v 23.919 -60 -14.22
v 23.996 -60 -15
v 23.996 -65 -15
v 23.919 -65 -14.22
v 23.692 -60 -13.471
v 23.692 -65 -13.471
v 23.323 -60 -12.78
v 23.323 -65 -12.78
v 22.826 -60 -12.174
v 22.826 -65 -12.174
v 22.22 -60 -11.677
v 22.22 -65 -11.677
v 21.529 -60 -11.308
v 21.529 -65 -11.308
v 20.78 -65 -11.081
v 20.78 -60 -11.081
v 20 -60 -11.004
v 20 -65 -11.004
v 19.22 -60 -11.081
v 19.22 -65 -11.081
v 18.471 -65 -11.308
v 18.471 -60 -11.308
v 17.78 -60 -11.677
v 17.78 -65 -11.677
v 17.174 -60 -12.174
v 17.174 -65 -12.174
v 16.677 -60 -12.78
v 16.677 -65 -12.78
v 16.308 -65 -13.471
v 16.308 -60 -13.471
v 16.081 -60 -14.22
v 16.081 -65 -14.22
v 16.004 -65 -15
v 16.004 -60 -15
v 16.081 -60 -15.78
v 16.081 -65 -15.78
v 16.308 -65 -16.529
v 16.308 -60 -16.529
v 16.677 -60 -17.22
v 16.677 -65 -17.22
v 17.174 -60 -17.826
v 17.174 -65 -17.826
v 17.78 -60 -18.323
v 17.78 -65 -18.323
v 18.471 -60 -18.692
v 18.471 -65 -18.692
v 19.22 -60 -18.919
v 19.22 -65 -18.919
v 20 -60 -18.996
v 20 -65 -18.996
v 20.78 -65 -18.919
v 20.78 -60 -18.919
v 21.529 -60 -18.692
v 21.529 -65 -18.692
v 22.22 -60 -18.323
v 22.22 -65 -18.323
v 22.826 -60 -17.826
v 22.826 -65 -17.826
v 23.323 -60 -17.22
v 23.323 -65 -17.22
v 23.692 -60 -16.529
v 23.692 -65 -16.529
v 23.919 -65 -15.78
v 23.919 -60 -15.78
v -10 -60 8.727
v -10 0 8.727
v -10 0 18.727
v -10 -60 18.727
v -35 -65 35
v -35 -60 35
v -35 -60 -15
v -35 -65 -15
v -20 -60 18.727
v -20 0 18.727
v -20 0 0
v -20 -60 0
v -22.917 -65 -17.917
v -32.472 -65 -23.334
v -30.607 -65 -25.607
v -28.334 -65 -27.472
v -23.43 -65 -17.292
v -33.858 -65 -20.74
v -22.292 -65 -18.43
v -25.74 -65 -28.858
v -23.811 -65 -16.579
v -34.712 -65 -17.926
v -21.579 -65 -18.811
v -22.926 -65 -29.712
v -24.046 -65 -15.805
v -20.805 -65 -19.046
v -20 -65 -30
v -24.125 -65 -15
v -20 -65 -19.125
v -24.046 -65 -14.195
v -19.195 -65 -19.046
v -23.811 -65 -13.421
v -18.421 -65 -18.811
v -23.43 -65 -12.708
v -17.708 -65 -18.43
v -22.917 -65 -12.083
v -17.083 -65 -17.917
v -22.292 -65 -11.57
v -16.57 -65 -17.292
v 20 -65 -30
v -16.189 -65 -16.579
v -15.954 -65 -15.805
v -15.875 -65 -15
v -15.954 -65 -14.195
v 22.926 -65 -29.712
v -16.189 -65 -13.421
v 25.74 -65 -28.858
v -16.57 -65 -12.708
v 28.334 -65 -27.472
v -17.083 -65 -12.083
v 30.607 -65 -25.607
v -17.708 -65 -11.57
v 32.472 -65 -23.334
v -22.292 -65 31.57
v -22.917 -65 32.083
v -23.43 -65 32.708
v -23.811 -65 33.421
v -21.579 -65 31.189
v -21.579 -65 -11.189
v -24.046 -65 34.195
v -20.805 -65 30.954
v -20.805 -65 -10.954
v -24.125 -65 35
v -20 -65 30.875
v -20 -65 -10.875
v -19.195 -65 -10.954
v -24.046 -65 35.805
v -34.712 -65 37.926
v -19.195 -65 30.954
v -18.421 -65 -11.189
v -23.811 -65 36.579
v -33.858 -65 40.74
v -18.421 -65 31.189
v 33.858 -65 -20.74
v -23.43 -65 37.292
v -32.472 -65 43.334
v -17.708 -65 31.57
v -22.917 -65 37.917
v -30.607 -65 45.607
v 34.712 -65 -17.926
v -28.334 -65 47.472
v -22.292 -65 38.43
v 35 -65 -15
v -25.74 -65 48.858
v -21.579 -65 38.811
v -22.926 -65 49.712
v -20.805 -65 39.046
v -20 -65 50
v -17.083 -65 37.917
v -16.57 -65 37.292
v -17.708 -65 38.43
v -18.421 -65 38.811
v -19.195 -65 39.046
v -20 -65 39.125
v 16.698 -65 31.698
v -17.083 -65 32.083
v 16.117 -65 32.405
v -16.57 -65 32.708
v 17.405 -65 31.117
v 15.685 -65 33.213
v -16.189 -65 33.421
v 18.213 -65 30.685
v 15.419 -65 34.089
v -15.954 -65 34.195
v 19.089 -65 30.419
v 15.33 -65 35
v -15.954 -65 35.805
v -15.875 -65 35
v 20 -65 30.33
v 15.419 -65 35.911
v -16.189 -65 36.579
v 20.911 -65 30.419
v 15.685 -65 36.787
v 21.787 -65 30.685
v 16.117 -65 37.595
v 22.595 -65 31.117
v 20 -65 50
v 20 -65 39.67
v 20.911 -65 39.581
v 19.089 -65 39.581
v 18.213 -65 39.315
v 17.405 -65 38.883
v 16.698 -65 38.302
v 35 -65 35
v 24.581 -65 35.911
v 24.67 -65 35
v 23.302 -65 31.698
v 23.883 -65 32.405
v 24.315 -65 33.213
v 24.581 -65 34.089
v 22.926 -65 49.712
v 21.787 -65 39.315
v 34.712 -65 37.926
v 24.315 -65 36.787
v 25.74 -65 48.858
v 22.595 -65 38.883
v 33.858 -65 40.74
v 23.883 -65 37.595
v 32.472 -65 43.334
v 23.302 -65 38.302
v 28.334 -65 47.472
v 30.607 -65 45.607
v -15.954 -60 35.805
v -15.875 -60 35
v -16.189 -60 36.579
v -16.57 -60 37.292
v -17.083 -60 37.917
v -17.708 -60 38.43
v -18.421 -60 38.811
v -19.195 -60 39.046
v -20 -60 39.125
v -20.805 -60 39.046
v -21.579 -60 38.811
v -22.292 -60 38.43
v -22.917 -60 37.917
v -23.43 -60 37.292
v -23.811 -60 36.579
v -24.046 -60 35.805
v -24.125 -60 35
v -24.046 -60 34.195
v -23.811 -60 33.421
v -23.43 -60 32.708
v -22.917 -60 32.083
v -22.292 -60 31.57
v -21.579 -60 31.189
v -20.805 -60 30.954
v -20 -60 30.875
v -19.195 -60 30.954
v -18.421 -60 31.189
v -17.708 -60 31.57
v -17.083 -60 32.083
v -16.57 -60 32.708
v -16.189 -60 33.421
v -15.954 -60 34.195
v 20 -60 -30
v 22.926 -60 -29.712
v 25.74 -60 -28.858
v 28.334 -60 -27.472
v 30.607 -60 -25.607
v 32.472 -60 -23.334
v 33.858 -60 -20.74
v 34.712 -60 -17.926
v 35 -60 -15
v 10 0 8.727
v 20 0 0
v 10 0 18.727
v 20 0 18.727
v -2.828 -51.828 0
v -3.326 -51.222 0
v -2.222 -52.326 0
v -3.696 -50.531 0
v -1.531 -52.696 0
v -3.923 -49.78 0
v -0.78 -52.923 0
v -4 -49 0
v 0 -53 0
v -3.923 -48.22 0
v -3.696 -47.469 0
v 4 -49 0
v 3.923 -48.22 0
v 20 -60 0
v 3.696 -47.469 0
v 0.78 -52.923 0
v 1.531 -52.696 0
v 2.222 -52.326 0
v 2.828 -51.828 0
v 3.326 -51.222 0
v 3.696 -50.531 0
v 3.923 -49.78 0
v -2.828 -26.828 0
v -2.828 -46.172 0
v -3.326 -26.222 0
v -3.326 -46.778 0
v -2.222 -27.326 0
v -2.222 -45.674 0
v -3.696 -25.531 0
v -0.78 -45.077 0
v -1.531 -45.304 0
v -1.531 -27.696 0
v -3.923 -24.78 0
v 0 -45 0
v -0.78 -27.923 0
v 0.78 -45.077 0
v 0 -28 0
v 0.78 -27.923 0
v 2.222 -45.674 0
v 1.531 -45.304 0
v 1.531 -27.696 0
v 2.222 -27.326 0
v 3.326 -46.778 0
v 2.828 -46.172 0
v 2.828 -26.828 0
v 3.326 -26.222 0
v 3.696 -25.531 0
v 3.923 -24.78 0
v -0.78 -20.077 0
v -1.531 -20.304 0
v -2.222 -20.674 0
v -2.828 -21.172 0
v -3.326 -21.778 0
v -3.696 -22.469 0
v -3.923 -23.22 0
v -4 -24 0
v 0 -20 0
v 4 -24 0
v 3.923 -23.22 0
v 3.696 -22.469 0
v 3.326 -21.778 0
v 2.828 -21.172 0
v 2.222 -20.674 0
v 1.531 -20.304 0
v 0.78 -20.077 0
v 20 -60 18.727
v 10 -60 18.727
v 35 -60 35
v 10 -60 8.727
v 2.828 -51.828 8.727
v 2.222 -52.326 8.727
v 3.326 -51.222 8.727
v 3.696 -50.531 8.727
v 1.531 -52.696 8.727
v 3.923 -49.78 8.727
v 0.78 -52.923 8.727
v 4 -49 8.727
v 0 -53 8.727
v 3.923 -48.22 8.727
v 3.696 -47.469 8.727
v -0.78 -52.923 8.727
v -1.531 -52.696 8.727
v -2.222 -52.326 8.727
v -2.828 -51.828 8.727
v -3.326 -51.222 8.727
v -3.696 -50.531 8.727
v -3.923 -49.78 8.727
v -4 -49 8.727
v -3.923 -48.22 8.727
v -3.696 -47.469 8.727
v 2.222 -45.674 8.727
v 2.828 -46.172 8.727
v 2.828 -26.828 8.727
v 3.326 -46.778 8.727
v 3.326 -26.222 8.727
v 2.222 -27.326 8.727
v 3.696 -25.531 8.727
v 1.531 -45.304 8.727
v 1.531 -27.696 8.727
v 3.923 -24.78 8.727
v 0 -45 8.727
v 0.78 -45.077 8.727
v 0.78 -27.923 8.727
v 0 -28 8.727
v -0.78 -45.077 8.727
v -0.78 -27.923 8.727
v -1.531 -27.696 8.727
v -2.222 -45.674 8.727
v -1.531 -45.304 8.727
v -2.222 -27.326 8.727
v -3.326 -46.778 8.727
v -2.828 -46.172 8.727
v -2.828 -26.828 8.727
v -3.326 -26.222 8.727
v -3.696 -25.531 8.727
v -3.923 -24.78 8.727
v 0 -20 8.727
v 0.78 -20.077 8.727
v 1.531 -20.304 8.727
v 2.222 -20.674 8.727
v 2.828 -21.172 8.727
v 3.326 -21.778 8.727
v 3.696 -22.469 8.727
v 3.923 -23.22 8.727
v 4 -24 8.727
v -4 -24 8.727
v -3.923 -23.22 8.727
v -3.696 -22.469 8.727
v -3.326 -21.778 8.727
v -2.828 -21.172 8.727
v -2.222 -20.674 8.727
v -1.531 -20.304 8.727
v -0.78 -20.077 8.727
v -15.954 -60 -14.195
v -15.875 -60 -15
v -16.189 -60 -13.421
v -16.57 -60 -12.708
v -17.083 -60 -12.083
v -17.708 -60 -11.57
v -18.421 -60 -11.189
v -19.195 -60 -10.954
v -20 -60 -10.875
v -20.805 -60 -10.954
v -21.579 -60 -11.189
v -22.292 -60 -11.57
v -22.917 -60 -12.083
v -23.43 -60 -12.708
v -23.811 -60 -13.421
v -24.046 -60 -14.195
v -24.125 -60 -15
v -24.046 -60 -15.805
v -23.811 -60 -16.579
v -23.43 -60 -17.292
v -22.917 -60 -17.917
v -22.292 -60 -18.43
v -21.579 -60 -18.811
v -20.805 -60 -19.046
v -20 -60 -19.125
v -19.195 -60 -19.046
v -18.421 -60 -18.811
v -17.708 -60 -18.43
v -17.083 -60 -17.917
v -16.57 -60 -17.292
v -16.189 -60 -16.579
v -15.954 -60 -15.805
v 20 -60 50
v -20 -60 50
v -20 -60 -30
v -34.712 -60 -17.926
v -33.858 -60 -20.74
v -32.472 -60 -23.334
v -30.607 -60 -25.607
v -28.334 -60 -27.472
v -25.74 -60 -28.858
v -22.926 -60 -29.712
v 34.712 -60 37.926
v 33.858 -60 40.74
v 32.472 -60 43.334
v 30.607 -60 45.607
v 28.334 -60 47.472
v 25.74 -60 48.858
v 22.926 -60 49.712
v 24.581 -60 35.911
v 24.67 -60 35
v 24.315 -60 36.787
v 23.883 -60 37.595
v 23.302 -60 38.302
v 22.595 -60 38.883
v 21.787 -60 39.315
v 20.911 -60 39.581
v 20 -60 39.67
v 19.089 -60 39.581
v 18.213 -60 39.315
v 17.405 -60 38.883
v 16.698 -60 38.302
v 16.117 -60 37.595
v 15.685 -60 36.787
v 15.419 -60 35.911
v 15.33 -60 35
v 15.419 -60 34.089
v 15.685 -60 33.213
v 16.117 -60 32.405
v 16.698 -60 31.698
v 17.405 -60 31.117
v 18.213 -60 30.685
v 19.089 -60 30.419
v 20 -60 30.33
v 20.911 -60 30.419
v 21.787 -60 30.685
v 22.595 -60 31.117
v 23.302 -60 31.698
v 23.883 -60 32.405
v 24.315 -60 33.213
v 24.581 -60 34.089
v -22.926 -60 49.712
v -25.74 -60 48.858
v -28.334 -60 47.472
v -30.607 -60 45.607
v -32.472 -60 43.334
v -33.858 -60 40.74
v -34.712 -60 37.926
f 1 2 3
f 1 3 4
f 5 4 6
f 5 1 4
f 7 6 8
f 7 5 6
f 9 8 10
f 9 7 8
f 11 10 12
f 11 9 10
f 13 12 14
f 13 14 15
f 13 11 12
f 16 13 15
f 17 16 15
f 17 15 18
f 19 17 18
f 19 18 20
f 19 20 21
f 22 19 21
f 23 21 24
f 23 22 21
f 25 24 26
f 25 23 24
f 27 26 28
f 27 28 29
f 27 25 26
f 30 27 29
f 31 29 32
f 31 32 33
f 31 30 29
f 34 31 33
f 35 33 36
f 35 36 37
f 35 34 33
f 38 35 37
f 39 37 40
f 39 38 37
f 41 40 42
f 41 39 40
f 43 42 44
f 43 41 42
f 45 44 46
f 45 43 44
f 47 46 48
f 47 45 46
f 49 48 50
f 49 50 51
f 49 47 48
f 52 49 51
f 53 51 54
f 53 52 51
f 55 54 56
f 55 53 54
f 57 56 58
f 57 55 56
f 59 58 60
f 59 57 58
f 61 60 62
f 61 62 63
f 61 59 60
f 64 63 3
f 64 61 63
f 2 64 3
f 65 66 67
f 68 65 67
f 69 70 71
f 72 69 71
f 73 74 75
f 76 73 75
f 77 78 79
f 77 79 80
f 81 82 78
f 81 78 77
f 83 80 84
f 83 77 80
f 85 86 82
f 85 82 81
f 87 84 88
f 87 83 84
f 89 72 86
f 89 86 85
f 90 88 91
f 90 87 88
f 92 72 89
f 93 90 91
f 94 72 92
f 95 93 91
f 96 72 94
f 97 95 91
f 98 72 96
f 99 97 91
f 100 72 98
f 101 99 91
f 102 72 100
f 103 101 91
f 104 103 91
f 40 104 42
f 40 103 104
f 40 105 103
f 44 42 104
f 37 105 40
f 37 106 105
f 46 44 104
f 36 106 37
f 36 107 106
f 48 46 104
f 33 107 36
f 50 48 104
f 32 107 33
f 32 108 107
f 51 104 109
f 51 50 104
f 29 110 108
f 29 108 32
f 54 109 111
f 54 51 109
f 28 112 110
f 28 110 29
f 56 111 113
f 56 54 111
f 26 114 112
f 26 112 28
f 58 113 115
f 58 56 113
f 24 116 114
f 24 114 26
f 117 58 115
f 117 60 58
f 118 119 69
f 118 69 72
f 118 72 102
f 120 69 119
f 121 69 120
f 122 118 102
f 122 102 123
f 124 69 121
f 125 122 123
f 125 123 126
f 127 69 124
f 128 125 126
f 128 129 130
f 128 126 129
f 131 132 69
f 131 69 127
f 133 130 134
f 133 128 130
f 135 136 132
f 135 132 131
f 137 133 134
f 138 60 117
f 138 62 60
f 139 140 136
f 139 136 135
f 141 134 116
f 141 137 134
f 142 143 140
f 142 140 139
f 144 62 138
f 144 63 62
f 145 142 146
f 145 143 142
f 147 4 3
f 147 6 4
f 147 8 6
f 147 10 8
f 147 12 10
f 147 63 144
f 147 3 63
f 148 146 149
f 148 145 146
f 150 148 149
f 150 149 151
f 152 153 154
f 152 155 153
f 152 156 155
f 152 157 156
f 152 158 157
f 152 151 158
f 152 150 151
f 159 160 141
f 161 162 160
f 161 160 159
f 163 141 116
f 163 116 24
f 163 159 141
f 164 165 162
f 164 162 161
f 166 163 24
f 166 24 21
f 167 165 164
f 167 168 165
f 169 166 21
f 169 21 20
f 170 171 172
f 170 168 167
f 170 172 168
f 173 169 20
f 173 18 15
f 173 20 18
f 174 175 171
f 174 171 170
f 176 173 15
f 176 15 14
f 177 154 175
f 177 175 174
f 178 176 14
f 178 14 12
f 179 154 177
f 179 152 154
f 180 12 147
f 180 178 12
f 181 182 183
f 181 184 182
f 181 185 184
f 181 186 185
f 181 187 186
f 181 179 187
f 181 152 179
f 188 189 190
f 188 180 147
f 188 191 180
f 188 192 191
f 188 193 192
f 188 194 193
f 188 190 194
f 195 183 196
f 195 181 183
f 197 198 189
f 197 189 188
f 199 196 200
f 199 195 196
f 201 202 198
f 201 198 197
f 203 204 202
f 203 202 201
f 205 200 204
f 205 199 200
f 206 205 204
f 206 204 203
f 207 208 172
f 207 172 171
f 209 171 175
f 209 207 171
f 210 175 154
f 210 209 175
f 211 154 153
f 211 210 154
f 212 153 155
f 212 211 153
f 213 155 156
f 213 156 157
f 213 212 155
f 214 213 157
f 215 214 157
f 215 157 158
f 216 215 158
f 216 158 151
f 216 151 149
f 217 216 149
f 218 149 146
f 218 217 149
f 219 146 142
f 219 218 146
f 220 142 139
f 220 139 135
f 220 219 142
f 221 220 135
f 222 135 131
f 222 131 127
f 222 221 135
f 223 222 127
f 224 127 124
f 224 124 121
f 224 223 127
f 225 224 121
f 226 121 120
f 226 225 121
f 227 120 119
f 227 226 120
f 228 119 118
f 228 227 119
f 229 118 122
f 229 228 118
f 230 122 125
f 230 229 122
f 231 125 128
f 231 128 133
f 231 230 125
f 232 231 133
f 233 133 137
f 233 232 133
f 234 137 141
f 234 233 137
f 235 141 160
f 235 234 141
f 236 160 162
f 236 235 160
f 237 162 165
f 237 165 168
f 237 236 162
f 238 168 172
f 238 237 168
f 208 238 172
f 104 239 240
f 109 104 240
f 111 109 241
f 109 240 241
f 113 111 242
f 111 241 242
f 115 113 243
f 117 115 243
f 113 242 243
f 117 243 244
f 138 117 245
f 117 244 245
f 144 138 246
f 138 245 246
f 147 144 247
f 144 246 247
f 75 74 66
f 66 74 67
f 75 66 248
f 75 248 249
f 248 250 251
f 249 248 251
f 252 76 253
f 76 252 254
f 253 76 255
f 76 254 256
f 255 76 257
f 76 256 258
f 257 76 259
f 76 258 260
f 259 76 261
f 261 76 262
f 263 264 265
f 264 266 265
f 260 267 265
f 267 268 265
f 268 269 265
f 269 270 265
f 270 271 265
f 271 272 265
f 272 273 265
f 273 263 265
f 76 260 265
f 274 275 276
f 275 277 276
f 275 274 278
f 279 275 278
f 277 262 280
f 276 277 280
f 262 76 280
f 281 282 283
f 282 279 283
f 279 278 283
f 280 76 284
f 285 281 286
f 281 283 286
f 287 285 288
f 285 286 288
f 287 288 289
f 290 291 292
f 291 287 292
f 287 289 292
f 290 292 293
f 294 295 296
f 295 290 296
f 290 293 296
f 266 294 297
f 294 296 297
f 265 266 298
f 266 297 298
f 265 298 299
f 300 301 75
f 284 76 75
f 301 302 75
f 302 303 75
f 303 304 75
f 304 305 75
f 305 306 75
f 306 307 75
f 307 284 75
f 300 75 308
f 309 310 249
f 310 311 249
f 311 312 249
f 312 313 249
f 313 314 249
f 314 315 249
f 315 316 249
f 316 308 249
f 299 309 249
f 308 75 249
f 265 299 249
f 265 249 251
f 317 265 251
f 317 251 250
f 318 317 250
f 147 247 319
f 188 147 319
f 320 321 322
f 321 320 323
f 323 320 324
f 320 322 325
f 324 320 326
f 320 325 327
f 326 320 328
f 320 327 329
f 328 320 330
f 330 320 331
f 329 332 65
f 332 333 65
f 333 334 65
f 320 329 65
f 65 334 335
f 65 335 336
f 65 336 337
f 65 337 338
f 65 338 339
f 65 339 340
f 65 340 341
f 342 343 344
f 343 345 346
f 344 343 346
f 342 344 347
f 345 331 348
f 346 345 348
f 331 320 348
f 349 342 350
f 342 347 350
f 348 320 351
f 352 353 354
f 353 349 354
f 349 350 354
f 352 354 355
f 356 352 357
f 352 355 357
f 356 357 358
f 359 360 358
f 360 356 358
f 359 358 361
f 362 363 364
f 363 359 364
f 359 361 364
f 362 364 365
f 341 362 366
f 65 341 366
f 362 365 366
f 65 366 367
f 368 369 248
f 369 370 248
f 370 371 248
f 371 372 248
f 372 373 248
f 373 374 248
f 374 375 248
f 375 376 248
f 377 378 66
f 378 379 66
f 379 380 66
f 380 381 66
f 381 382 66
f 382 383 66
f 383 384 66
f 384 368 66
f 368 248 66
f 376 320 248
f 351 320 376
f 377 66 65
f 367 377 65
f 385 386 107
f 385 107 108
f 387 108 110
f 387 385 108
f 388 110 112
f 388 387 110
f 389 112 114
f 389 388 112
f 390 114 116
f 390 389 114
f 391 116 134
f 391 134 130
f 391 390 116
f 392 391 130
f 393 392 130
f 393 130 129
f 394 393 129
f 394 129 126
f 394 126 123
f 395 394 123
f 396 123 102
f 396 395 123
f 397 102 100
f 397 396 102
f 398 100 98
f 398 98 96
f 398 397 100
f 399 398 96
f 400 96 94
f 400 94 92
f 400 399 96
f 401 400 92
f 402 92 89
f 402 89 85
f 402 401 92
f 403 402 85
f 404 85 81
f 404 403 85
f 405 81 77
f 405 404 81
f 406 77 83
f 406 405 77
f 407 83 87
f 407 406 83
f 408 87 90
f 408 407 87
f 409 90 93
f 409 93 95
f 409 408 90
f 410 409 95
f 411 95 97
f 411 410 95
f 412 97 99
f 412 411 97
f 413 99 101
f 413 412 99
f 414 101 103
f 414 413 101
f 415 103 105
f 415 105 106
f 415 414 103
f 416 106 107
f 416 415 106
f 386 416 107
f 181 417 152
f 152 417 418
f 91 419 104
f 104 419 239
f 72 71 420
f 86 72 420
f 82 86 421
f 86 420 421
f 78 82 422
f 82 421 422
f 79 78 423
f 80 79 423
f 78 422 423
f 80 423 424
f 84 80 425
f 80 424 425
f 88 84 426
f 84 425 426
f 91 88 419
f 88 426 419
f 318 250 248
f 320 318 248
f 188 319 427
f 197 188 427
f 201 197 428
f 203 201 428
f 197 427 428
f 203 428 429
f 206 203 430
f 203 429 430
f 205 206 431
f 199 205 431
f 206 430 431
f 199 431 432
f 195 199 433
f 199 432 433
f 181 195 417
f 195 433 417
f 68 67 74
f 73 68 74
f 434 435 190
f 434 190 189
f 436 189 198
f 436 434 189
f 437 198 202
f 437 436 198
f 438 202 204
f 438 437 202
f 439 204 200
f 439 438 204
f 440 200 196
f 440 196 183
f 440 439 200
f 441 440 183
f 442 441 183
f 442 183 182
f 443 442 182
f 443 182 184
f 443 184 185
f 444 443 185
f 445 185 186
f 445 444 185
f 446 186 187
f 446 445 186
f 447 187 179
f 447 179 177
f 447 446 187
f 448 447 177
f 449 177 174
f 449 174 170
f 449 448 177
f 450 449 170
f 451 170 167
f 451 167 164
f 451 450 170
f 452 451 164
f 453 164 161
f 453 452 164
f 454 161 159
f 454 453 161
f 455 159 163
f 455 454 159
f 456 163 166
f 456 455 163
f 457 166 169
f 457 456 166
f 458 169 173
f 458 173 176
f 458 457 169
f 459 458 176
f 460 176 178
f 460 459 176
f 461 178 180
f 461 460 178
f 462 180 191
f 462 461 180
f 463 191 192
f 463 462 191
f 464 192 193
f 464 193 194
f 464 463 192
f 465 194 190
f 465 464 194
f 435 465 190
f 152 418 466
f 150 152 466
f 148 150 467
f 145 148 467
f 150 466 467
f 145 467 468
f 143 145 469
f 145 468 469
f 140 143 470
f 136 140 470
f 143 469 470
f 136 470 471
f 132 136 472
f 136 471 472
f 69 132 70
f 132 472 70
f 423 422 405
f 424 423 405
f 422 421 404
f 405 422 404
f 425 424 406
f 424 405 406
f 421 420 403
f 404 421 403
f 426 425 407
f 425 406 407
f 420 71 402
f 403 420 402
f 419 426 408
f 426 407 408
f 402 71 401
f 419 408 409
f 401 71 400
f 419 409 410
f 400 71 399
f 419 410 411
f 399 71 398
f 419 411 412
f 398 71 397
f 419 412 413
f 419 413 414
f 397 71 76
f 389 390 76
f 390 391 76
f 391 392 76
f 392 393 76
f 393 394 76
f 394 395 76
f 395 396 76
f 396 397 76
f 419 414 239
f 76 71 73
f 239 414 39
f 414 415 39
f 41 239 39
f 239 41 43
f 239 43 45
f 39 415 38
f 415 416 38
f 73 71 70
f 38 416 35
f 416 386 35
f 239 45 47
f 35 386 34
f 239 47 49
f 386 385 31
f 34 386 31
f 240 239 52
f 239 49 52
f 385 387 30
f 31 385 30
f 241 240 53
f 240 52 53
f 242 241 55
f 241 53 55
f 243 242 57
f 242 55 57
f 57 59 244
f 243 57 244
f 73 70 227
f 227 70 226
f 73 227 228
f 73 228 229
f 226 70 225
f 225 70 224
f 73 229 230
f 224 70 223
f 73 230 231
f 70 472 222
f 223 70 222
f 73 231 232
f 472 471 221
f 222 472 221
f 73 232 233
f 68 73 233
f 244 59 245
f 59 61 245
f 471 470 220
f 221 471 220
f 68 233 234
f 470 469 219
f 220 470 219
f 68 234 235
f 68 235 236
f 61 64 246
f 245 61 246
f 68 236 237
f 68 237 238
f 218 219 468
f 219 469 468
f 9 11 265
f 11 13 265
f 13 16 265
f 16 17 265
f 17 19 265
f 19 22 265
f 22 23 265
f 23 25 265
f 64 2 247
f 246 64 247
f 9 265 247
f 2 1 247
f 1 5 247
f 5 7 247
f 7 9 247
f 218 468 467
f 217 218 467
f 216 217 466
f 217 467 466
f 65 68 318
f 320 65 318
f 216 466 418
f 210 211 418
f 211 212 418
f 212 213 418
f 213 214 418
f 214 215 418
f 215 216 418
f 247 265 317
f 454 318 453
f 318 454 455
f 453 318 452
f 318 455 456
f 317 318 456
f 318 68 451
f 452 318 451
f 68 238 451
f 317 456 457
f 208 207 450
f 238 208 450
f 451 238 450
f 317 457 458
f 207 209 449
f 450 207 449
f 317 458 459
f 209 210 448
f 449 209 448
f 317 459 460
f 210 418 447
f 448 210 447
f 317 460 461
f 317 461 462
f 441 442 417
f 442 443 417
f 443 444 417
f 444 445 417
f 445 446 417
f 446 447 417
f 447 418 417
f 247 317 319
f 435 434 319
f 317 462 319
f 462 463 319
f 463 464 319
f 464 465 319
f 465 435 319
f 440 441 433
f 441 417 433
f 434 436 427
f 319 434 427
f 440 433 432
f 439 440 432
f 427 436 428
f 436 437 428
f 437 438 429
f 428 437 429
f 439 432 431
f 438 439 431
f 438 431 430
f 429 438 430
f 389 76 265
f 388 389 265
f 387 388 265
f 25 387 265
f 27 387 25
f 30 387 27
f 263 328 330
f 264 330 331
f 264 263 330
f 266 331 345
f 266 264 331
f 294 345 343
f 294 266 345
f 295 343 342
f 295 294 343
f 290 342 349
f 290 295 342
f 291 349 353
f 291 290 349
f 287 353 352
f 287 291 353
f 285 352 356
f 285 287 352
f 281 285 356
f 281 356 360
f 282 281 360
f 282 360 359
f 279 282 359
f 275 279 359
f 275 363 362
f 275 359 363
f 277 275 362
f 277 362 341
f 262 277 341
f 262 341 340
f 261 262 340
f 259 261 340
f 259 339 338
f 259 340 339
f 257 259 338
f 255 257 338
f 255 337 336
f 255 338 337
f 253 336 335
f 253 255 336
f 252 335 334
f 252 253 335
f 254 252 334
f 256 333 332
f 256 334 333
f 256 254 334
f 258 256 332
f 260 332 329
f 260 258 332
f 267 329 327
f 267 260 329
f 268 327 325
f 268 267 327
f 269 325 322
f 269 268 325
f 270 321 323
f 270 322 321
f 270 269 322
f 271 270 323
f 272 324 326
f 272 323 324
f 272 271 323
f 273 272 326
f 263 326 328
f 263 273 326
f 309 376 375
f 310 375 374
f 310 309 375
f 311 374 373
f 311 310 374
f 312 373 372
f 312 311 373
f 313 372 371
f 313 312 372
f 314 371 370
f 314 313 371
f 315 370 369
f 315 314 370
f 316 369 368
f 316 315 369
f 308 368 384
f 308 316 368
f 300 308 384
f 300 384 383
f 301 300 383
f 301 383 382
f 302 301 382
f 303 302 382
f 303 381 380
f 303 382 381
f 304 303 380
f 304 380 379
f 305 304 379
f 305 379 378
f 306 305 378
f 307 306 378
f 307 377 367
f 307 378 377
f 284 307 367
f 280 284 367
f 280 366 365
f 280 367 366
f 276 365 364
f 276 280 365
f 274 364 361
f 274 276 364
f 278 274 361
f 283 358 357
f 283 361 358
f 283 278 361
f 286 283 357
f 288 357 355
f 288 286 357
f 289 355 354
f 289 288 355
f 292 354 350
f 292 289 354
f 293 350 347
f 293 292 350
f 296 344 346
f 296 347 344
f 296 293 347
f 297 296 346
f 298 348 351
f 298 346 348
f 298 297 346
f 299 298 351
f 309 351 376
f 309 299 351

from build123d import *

# Parameters (mm, degrees)
F1_DEPTH = 60
F2_R     = 4.125
F2_R_2   = 3.996282
F2_R_3   = 4.670247
F3_DEPTH = 5
F4_R     = 4
F5_DEPTH = 50.001


with BuildPart() as f1:
    # F0 (on Front) → F1 (new body)
    with BuildSketch(Plane.XZ):
        Polygon((-20, 18.727273), (-20, 0), (20, 0), (20, 18.727273), (10, 18.727273), (10, 8.727273), (-10, 8.727273), (-10, 18.727273), align=None)
    extrude(amount=F1_DEPTH)

    # F2 (on face) → F3 (join)
    with BuildSketch(Plane.XZ.offset(60)):
        with BuildLine():
            Line((20, 50), (-20, 50))
            ThreePointArc((-20, 50), (-30.606602, 45.606602), (-35, 35))
            Line((-35, 35), (-35, -15))
            ThreePointArc((-35, -15), (-30.606602, -25.606602), (-20, -30))
            Line((-20, -30), (20, -30))
            ThreePointArc((20, -30), (30.606602, -25.606602), (35, -15))
            Line((35, -15), (35, 35))
            ThreePointArc((35, 35), (30.606602, 45.606602), (20, 50))
        make_face()
        with Locations((-20, -15)):
            Circle(F2_R, mode=Mode.SUBTRACT)
        with Locations((20, -15)):
            Circle(F2_R_2, mode=Mode.SUBTRACT)
        with Locations((-20, 35)):
            Circle(F2_R, mode=Mode.SUBTRACT)
        with Locations((20, 35)):
            Circle(F2_R_3, mode=Mode.SUBTRACT)
    extrude(amount=F3_DEPTH)

    # F4 (on Top) → F5 (cut, through all)
    with BuildSketch(Plane.XY):
        with Locations((0, -49)):
            Circle(F4_R)
        with Locations((0, -24)):
            Circle(F4_R)
    extrude(amount=F5_DEPTH, mode=Mode.SUBTRACT)


solid = f1.part
